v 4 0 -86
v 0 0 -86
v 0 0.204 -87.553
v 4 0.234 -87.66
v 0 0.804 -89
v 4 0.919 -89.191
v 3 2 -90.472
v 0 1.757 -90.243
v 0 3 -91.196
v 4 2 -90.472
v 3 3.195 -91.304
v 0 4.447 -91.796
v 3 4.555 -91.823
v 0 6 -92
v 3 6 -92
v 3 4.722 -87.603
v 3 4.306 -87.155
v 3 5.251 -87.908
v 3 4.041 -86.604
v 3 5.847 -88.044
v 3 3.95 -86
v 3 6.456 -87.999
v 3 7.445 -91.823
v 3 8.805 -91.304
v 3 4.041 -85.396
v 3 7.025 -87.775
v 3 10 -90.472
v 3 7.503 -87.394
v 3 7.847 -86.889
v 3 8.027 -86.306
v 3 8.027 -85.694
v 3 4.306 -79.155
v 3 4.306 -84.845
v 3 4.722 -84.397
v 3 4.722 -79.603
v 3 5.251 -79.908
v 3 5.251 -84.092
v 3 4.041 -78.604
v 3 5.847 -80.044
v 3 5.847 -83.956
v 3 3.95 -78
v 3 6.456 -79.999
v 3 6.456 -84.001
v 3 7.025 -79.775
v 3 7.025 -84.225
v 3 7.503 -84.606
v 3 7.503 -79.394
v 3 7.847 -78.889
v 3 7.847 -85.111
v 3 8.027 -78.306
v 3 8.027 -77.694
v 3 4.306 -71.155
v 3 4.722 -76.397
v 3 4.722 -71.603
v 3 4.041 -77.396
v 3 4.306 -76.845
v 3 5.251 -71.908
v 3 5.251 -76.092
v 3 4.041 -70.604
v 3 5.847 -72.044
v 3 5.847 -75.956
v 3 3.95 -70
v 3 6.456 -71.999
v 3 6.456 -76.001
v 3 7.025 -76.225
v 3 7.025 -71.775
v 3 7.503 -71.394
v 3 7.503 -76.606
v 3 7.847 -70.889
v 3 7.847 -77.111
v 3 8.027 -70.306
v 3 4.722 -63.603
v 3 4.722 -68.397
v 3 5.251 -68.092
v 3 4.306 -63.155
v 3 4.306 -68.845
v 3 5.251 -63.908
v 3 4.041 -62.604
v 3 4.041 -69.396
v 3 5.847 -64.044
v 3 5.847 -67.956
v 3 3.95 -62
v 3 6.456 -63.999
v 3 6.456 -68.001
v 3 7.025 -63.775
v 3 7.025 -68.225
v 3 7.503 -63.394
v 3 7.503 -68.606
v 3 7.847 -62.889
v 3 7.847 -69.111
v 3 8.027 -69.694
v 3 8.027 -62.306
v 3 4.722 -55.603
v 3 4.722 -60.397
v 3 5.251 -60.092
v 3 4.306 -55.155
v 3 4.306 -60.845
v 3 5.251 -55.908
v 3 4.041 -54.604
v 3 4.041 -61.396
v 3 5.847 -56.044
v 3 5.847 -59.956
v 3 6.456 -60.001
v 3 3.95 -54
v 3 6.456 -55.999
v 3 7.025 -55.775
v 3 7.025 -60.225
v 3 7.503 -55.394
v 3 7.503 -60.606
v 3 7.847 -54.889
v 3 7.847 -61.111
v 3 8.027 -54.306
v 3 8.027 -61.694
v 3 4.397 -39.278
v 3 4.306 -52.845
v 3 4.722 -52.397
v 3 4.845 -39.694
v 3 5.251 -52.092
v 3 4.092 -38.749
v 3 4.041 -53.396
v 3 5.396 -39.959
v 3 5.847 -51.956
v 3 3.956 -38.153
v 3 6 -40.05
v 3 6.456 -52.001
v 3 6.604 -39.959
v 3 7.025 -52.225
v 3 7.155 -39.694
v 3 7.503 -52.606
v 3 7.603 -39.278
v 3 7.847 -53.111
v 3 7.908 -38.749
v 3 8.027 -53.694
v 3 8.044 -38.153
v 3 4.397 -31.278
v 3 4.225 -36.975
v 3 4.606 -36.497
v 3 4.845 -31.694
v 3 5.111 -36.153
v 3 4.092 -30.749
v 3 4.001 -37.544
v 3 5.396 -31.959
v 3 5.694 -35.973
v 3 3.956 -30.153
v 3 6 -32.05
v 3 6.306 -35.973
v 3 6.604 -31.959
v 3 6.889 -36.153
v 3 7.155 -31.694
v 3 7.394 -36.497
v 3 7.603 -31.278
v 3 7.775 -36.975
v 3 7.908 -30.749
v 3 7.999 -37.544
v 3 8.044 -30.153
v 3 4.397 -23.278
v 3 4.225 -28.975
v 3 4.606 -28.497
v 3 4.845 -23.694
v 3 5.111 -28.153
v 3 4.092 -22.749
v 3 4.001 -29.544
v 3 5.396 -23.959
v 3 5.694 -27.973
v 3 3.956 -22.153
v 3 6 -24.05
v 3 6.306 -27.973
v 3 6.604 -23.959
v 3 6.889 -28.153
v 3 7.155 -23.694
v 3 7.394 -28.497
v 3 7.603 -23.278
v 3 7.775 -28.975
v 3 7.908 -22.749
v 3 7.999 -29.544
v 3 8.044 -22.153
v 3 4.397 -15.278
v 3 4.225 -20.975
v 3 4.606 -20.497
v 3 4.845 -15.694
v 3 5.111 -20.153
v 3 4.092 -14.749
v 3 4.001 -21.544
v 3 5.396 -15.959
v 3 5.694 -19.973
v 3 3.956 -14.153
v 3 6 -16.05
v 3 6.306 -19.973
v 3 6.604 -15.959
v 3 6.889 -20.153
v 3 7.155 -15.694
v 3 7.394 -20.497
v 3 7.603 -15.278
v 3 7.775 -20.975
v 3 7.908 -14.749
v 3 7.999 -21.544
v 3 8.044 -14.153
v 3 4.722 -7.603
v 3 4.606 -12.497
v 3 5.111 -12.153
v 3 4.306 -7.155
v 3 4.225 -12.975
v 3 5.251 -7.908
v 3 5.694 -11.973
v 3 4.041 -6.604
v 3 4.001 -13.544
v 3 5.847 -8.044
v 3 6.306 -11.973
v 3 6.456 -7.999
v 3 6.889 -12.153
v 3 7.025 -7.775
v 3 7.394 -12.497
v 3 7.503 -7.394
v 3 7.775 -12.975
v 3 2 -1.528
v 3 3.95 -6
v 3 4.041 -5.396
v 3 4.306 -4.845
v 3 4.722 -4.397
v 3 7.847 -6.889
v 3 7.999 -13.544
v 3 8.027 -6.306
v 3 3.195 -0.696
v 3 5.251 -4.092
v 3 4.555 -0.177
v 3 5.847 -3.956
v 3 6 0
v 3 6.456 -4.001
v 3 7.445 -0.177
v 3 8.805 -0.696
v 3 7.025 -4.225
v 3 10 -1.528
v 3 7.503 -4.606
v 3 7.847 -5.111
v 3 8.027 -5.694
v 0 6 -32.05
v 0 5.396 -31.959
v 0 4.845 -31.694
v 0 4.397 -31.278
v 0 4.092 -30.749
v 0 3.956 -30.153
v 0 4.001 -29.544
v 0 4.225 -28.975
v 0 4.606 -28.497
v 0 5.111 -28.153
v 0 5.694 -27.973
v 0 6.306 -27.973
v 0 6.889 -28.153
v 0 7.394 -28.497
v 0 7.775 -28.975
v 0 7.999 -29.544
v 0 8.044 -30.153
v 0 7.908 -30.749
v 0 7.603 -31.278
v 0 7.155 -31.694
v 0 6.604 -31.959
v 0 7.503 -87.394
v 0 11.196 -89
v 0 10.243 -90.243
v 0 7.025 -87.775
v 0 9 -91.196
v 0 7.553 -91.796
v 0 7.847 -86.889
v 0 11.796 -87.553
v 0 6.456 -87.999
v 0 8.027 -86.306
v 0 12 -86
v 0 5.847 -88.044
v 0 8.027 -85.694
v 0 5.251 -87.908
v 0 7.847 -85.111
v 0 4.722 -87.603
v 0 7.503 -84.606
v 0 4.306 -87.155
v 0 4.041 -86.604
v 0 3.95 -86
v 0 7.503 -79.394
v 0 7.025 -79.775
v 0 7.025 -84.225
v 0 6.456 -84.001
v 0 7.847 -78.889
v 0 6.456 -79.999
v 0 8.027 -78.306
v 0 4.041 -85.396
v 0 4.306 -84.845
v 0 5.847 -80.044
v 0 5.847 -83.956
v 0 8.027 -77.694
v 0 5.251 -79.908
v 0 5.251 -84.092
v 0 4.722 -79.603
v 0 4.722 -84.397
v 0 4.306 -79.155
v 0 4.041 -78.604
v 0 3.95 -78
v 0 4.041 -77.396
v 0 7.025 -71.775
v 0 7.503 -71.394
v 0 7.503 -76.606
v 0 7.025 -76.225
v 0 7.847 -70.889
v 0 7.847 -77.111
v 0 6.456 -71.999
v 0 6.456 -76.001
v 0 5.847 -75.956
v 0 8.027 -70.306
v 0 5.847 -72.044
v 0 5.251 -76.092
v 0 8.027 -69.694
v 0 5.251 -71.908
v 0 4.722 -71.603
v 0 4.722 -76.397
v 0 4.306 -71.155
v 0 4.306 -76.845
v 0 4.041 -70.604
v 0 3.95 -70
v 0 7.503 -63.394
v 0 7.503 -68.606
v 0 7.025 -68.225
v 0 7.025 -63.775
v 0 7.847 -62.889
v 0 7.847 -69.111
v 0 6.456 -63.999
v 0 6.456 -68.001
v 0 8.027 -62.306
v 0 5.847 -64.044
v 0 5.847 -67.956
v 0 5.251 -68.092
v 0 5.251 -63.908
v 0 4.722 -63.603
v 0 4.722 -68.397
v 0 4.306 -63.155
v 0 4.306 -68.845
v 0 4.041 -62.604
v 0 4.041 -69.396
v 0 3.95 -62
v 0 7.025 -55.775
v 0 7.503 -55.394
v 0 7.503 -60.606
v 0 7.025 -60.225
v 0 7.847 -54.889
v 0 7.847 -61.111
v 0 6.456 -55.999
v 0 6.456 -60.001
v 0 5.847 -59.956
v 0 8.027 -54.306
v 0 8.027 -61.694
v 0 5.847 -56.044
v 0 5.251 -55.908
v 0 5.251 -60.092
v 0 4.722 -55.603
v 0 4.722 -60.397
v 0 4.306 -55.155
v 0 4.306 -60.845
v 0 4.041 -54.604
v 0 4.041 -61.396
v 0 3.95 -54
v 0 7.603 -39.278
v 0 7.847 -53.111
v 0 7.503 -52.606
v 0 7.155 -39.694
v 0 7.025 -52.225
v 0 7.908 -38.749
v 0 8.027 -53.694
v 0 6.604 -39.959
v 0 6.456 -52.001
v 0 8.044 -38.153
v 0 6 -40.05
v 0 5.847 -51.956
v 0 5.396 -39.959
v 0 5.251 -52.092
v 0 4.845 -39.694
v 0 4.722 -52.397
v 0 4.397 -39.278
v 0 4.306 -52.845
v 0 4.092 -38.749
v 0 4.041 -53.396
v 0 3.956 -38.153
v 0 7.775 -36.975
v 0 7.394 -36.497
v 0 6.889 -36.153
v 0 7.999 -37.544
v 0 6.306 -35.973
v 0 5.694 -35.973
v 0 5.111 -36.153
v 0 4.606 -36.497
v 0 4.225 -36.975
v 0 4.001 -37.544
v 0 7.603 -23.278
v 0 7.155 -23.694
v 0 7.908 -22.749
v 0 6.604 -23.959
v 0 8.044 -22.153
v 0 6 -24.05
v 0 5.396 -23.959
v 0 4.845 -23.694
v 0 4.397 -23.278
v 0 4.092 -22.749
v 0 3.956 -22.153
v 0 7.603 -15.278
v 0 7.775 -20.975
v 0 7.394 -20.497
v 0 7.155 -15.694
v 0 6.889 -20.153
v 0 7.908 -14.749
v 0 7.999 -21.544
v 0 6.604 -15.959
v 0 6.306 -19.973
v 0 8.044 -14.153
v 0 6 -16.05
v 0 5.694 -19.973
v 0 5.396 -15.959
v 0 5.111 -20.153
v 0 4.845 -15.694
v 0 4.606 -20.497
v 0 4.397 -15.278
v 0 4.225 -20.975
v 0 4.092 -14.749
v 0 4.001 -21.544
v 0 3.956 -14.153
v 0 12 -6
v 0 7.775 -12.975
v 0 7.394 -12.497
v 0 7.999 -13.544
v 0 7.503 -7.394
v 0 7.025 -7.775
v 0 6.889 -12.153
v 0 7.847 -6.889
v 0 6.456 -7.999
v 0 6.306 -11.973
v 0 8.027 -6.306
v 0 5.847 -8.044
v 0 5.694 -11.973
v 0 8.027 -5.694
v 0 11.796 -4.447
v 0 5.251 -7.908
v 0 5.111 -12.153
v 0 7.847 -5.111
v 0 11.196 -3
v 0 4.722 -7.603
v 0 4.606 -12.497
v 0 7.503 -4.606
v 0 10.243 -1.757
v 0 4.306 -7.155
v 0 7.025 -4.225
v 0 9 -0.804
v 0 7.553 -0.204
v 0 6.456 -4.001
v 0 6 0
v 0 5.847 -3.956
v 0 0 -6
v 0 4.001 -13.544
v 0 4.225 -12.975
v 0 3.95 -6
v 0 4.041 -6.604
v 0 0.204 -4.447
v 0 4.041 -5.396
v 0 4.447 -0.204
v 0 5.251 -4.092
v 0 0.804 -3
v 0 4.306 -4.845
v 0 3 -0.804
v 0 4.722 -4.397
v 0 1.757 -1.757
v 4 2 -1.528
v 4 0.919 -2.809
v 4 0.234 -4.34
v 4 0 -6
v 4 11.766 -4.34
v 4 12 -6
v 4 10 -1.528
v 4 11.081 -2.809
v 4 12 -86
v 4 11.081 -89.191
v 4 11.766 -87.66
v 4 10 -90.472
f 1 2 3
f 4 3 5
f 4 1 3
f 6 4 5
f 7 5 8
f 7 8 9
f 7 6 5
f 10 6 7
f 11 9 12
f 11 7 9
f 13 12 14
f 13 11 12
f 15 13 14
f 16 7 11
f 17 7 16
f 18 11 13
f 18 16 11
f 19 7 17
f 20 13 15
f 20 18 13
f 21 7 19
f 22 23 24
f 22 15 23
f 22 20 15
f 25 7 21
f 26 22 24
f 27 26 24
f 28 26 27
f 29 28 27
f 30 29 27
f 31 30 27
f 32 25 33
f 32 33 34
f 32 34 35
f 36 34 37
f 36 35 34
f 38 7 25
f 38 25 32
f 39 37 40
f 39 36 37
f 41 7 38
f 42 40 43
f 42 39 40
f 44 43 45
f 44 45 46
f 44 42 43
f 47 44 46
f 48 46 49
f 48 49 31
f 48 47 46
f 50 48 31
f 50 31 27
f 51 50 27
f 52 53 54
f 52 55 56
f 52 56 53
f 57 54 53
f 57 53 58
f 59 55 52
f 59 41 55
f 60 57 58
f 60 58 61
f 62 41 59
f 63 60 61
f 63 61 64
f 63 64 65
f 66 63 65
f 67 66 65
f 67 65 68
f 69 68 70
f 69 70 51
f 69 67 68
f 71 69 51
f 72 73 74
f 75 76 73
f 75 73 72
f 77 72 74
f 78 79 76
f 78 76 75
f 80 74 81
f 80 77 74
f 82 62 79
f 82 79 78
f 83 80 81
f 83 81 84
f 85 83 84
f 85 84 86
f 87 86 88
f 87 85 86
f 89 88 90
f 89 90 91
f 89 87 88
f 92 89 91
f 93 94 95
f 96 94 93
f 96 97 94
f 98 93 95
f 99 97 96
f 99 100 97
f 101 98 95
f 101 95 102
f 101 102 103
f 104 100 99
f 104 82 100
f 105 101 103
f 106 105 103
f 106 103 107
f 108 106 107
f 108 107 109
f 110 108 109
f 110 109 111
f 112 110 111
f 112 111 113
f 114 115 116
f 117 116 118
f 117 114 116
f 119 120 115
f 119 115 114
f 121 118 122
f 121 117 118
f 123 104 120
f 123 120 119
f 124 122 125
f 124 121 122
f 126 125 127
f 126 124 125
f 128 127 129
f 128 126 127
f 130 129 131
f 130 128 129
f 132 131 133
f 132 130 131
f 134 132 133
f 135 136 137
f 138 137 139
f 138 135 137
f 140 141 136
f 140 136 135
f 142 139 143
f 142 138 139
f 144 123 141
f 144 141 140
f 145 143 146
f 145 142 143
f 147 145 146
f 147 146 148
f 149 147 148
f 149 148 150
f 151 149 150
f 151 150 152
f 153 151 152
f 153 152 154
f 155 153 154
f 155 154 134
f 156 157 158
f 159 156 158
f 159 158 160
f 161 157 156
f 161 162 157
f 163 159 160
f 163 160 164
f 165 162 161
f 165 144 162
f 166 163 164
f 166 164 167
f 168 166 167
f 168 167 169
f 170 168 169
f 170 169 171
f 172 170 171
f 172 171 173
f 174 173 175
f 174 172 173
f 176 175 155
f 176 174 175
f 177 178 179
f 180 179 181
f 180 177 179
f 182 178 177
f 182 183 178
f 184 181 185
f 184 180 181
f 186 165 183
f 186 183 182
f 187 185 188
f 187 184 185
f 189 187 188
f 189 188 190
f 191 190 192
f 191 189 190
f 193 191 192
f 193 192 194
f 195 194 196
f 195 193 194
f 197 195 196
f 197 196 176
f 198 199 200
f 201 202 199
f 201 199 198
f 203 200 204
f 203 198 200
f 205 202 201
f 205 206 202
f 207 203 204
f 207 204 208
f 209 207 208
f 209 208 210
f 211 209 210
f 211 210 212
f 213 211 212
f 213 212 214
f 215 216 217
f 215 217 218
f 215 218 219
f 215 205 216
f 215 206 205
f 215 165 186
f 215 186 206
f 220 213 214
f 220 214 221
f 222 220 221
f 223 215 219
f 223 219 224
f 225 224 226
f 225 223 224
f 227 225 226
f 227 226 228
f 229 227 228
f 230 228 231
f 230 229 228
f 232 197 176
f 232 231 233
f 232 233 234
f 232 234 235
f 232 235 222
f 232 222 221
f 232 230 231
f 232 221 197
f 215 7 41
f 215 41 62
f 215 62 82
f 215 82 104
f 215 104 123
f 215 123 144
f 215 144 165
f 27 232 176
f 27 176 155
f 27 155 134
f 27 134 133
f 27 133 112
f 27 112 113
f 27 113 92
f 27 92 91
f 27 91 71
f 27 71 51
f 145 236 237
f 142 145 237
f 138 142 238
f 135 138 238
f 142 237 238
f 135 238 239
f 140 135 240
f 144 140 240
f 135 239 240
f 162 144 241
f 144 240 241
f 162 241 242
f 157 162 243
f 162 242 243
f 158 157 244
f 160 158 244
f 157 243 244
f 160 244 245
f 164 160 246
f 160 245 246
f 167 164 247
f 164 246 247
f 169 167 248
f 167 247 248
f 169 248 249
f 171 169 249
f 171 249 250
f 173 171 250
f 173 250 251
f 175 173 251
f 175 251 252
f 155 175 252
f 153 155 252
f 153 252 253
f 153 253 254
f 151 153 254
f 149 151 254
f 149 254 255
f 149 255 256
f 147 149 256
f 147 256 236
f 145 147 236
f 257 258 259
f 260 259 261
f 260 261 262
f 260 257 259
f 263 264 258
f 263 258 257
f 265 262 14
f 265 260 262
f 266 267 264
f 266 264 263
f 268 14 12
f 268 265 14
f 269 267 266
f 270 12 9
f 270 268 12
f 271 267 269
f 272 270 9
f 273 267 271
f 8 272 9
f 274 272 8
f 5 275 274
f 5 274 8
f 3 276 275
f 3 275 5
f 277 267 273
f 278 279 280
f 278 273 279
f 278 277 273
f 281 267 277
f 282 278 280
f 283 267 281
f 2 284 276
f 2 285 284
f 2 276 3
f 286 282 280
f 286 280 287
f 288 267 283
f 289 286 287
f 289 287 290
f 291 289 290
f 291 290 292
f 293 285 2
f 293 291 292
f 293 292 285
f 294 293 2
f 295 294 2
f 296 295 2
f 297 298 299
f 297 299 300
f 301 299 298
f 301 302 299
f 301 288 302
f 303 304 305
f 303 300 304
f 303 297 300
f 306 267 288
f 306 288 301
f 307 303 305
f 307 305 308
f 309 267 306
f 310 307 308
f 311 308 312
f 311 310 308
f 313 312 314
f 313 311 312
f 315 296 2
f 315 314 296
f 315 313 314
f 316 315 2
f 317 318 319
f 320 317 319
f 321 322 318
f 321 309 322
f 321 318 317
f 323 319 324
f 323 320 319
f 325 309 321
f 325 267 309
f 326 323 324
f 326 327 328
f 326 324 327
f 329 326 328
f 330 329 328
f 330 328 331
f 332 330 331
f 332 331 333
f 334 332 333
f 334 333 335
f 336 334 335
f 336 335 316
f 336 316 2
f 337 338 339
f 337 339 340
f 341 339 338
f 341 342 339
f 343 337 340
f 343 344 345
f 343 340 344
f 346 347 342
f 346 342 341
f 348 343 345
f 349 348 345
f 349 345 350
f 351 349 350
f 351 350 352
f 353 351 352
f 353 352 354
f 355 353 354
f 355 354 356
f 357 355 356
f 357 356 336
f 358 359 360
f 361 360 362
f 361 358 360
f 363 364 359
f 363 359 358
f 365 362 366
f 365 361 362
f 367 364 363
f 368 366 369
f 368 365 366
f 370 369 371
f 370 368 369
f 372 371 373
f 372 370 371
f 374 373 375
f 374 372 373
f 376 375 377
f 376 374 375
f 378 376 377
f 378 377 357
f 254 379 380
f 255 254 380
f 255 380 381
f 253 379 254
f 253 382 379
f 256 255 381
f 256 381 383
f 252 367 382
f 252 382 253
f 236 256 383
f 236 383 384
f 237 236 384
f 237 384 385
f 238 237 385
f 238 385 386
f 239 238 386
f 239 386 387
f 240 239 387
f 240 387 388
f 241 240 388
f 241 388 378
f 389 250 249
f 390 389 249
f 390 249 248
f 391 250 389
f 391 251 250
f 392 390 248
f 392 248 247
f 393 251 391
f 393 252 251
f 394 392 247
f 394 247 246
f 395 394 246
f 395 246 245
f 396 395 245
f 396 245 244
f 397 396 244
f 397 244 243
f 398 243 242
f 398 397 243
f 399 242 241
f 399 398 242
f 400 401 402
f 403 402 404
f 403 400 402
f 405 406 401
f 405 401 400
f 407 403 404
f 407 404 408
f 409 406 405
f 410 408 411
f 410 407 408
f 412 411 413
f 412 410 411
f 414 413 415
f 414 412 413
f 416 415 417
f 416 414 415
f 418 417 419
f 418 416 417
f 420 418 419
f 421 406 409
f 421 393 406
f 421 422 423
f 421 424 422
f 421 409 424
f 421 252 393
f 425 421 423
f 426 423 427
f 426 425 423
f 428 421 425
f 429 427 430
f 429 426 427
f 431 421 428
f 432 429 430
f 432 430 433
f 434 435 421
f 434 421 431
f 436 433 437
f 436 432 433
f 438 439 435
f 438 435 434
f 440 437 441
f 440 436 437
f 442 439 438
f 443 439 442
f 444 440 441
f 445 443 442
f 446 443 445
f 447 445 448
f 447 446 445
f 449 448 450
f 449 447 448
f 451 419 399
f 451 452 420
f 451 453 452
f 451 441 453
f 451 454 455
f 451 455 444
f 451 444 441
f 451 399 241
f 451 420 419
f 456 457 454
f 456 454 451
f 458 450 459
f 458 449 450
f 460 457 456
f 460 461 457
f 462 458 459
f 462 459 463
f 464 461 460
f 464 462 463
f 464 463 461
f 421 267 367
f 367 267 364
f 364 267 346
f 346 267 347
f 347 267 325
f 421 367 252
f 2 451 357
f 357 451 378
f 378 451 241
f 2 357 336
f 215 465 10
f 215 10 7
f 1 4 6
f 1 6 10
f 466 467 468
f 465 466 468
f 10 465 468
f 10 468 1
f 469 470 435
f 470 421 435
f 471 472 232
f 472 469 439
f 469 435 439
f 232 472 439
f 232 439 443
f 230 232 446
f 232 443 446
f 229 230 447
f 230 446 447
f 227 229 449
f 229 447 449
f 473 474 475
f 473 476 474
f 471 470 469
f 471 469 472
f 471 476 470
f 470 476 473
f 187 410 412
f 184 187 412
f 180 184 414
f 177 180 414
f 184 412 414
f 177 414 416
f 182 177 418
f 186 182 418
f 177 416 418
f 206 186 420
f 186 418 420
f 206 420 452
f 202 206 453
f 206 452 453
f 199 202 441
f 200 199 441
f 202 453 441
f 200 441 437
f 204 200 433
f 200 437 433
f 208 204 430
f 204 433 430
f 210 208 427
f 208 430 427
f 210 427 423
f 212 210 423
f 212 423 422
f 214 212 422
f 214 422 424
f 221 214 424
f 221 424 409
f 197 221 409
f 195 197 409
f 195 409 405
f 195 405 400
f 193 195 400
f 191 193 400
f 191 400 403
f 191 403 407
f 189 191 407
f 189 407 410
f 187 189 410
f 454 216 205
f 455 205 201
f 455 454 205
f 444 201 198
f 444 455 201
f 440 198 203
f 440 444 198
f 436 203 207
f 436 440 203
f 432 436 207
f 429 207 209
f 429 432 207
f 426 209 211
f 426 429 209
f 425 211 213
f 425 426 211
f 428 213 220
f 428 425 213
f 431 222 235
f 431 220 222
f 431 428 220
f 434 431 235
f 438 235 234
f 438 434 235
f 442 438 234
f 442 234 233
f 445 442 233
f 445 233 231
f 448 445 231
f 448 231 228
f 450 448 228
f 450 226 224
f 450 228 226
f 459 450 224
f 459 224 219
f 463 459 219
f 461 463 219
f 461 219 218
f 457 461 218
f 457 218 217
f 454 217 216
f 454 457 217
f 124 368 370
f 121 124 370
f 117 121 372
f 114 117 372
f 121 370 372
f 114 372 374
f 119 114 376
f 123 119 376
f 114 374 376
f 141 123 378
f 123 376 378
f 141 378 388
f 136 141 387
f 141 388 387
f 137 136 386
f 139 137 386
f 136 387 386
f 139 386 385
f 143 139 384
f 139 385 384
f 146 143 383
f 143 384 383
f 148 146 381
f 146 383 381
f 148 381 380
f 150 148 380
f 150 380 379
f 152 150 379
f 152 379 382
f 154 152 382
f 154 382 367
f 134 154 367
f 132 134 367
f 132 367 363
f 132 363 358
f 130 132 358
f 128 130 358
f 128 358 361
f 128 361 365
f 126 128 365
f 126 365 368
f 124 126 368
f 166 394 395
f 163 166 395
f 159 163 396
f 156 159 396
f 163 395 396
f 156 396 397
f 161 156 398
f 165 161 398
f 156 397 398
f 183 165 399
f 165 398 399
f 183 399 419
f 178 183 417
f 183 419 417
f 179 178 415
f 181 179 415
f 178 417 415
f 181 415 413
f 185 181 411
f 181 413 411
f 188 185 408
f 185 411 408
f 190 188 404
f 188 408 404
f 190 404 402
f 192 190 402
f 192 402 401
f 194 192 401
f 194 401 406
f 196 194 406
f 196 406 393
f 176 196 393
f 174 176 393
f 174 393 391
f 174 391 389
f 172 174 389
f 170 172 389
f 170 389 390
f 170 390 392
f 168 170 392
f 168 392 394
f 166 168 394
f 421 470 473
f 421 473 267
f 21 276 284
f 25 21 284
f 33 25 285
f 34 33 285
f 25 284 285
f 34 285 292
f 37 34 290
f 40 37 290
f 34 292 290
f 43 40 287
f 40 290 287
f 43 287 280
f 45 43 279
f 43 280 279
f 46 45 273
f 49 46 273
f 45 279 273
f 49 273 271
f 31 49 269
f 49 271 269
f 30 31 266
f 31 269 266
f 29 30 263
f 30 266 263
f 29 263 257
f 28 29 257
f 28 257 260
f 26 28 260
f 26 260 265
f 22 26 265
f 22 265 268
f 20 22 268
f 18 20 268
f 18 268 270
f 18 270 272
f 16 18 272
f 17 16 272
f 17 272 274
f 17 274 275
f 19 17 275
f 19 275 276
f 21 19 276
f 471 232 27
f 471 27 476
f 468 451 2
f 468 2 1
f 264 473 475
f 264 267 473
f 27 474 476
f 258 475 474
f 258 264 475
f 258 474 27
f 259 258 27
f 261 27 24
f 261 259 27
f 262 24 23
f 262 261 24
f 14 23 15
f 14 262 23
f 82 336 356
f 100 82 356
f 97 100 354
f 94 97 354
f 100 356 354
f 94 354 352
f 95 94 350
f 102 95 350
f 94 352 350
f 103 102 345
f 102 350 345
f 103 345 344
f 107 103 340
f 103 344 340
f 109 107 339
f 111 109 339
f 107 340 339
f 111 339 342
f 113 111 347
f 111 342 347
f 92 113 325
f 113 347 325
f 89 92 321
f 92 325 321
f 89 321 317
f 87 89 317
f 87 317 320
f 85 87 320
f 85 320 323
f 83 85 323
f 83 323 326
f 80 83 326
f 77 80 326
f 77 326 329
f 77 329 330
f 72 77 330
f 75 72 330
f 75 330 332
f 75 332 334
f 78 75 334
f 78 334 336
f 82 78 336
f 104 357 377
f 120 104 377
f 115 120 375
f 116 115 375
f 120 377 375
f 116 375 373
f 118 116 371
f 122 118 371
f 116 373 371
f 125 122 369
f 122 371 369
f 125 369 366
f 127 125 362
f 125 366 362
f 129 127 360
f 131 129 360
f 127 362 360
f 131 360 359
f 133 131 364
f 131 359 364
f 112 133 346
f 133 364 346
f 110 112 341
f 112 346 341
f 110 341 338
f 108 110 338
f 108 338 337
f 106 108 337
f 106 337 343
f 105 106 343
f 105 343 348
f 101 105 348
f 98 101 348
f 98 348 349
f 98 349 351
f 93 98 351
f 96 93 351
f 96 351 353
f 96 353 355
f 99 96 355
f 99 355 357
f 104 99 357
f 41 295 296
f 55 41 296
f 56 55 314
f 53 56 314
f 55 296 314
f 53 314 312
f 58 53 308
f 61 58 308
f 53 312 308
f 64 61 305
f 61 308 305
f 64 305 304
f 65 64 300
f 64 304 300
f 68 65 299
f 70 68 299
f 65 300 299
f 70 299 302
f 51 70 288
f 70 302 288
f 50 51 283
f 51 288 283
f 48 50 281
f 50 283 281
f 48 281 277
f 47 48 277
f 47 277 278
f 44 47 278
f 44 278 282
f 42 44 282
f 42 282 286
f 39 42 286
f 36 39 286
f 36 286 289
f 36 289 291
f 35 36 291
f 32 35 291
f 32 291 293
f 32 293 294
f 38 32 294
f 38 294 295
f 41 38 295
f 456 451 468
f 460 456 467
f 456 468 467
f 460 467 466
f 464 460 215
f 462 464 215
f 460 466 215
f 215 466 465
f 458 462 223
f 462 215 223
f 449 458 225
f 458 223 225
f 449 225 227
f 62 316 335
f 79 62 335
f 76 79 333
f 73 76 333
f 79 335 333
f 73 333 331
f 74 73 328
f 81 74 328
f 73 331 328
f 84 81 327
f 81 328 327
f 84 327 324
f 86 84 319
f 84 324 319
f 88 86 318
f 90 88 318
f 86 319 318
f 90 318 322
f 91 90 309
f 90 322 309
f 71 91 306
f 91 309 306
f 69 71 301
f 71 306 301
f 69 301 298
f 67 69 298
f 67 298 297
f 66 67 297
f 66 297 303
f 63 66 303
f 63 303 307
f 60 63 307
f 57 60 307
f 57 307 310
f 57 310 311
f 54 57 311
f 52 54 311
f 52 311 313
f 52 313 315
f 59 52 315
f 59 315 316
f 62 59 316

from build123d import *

# Parameters (mm, degrees)
BOSS_EXTRUDE1_DEPTH     = 92
FILLET1_R               = 6
SKETCH2_R               = 2.05
CUT_EXTRUDE1_DEPTH      = 93.86549413
LPATTERN1_COUNT         = 5
LPATTERN1_PITCH         = 8
MIRROR1_COPY_1_SKETCH_R = 2.05
MIRROR1_COPY_1_DEPTH    = 93.86549413
MIRROR1_COPY_2_SKETCH_R = 2.05
MIRROR1_COPY_2_DEPTH    = 93.86549413
MIRROR1_COPY_3_SKETCH_R = 2.05
MIRROR1_COPY_3_DEPTH    = 93.86549413
MIRROR1_COPY_4_SKETCH_R = 2.05
MIRROR1_COPY_4_DEPTH    = 93.86549413


with BuildPart() as part:
    # Sketch1 → Boss-Extrude1 (new body)
    with BuildSketch(Plane.XY):
        Polygon((0, 0), (4, 0), (4, 2), (3, 2), (3, 10), (4, 10), (4, 12), (0, 12), align=None)
    extrude(amount=-BOSS_EXTRUDE1_DEPTH)

    # Fillet1
    fillet1_edges = [part.edges().sort_by_distance(p)[0] for p in [
        (2, 12, 0),
        (2, 0, 0),
        (2, 0, -92),
        (2, 12, -92),
    ]]
    fillet(fillet1_edges, radius=FILLET1_R - 0.0001)  # a hair under: the kernel refuses the full size

    # Sketch2 → Cut-Extrude1 (cut, through all)
    with BuildSketch(Plane.ZY):
        with Locations(Location((-86, 6, 0), (0, 0, 270))):
            Circle(SKETCH2_R)
    cut_extrude1 = extrude(amount=-CUT_EXTRUDE1_DEPTH, mode=Mode.SUBTRACT)

    # LPattern1: Cut-Extrude1 ×5
    with Locations(*[(0, 0, i * LPATTERN1_PITCH) for i in range(1, LPATTERN1_COUNT)]):
        add(cut_extrude1, mode=Mode.SUBTRACT)

    # Mirror1: Cut-Extrude1 across plane
    add(cut_extrude1.mirror(Plane.XY.offset(-46)), mode=Mode.SUBTRACT)

    # Mirror1 copy 1 sketch → Mirror1 copy 1 (cut, through all)
    with BuildSketch(Plane(origin=(0, 0, -100), x_dir=(0, 0, -1), z_dir=(-1, 0, 0))):
        with Locations((-86, -6)):
            Circle(MIRROR1_COPY_1_SKETCH_R)
    extrude(amount=-MIRROR1_COPY_1_DEPTH, mode=Mode.SUBTRACT)

    # Mirror1 copy 2 sketch → Mirror1 copy 2 (cut, through all)
    with BuildSketch(Plane(origin=(0, 0, -108), x_dir=(0, 0, -1), z_dir=(-1, 0, 0))):
        with Locations((-86, -6)):
            Circle(MIRROR1_COPY_2_SKETCH_R)
    extrude(amount=-MIRROR1_COPY_2_DEPTH, mode=Mode.SUBTRACT)

    # Mirror1 copy 3 sketch → Mirror1 copy 3 (cut, through all)
    with BuildSketch(Plane(origin=(0, 0, -116), x_dir=(0, 0, -1), z_dir=(-1, 0, 0))):
        with Locations((-86, -6)):
            Circle(MIRROR1_COPY_3_SKETCH_R)
    extrude(amount=-MIRROR1_COPY_3_DEPTH, mode=Mode.SUBTRACT)

    # Mirror1 copy 4 sketch → Mirror1 copy 4 (cut, through all)
    with BuildSketch(Plane(origin=(0, 0, -124), x_dir=(0, 0, -1), z_dir=(-1, 0, 0))):
        with Locations((-86, -6)):
            Circle(MIRROR1_COPY_4_SKETCH_R)
    extrude(amount=-MIRROR1_COPY_4_DEPTH, mode=Mode.SUBTRACT)


solid = part.part
